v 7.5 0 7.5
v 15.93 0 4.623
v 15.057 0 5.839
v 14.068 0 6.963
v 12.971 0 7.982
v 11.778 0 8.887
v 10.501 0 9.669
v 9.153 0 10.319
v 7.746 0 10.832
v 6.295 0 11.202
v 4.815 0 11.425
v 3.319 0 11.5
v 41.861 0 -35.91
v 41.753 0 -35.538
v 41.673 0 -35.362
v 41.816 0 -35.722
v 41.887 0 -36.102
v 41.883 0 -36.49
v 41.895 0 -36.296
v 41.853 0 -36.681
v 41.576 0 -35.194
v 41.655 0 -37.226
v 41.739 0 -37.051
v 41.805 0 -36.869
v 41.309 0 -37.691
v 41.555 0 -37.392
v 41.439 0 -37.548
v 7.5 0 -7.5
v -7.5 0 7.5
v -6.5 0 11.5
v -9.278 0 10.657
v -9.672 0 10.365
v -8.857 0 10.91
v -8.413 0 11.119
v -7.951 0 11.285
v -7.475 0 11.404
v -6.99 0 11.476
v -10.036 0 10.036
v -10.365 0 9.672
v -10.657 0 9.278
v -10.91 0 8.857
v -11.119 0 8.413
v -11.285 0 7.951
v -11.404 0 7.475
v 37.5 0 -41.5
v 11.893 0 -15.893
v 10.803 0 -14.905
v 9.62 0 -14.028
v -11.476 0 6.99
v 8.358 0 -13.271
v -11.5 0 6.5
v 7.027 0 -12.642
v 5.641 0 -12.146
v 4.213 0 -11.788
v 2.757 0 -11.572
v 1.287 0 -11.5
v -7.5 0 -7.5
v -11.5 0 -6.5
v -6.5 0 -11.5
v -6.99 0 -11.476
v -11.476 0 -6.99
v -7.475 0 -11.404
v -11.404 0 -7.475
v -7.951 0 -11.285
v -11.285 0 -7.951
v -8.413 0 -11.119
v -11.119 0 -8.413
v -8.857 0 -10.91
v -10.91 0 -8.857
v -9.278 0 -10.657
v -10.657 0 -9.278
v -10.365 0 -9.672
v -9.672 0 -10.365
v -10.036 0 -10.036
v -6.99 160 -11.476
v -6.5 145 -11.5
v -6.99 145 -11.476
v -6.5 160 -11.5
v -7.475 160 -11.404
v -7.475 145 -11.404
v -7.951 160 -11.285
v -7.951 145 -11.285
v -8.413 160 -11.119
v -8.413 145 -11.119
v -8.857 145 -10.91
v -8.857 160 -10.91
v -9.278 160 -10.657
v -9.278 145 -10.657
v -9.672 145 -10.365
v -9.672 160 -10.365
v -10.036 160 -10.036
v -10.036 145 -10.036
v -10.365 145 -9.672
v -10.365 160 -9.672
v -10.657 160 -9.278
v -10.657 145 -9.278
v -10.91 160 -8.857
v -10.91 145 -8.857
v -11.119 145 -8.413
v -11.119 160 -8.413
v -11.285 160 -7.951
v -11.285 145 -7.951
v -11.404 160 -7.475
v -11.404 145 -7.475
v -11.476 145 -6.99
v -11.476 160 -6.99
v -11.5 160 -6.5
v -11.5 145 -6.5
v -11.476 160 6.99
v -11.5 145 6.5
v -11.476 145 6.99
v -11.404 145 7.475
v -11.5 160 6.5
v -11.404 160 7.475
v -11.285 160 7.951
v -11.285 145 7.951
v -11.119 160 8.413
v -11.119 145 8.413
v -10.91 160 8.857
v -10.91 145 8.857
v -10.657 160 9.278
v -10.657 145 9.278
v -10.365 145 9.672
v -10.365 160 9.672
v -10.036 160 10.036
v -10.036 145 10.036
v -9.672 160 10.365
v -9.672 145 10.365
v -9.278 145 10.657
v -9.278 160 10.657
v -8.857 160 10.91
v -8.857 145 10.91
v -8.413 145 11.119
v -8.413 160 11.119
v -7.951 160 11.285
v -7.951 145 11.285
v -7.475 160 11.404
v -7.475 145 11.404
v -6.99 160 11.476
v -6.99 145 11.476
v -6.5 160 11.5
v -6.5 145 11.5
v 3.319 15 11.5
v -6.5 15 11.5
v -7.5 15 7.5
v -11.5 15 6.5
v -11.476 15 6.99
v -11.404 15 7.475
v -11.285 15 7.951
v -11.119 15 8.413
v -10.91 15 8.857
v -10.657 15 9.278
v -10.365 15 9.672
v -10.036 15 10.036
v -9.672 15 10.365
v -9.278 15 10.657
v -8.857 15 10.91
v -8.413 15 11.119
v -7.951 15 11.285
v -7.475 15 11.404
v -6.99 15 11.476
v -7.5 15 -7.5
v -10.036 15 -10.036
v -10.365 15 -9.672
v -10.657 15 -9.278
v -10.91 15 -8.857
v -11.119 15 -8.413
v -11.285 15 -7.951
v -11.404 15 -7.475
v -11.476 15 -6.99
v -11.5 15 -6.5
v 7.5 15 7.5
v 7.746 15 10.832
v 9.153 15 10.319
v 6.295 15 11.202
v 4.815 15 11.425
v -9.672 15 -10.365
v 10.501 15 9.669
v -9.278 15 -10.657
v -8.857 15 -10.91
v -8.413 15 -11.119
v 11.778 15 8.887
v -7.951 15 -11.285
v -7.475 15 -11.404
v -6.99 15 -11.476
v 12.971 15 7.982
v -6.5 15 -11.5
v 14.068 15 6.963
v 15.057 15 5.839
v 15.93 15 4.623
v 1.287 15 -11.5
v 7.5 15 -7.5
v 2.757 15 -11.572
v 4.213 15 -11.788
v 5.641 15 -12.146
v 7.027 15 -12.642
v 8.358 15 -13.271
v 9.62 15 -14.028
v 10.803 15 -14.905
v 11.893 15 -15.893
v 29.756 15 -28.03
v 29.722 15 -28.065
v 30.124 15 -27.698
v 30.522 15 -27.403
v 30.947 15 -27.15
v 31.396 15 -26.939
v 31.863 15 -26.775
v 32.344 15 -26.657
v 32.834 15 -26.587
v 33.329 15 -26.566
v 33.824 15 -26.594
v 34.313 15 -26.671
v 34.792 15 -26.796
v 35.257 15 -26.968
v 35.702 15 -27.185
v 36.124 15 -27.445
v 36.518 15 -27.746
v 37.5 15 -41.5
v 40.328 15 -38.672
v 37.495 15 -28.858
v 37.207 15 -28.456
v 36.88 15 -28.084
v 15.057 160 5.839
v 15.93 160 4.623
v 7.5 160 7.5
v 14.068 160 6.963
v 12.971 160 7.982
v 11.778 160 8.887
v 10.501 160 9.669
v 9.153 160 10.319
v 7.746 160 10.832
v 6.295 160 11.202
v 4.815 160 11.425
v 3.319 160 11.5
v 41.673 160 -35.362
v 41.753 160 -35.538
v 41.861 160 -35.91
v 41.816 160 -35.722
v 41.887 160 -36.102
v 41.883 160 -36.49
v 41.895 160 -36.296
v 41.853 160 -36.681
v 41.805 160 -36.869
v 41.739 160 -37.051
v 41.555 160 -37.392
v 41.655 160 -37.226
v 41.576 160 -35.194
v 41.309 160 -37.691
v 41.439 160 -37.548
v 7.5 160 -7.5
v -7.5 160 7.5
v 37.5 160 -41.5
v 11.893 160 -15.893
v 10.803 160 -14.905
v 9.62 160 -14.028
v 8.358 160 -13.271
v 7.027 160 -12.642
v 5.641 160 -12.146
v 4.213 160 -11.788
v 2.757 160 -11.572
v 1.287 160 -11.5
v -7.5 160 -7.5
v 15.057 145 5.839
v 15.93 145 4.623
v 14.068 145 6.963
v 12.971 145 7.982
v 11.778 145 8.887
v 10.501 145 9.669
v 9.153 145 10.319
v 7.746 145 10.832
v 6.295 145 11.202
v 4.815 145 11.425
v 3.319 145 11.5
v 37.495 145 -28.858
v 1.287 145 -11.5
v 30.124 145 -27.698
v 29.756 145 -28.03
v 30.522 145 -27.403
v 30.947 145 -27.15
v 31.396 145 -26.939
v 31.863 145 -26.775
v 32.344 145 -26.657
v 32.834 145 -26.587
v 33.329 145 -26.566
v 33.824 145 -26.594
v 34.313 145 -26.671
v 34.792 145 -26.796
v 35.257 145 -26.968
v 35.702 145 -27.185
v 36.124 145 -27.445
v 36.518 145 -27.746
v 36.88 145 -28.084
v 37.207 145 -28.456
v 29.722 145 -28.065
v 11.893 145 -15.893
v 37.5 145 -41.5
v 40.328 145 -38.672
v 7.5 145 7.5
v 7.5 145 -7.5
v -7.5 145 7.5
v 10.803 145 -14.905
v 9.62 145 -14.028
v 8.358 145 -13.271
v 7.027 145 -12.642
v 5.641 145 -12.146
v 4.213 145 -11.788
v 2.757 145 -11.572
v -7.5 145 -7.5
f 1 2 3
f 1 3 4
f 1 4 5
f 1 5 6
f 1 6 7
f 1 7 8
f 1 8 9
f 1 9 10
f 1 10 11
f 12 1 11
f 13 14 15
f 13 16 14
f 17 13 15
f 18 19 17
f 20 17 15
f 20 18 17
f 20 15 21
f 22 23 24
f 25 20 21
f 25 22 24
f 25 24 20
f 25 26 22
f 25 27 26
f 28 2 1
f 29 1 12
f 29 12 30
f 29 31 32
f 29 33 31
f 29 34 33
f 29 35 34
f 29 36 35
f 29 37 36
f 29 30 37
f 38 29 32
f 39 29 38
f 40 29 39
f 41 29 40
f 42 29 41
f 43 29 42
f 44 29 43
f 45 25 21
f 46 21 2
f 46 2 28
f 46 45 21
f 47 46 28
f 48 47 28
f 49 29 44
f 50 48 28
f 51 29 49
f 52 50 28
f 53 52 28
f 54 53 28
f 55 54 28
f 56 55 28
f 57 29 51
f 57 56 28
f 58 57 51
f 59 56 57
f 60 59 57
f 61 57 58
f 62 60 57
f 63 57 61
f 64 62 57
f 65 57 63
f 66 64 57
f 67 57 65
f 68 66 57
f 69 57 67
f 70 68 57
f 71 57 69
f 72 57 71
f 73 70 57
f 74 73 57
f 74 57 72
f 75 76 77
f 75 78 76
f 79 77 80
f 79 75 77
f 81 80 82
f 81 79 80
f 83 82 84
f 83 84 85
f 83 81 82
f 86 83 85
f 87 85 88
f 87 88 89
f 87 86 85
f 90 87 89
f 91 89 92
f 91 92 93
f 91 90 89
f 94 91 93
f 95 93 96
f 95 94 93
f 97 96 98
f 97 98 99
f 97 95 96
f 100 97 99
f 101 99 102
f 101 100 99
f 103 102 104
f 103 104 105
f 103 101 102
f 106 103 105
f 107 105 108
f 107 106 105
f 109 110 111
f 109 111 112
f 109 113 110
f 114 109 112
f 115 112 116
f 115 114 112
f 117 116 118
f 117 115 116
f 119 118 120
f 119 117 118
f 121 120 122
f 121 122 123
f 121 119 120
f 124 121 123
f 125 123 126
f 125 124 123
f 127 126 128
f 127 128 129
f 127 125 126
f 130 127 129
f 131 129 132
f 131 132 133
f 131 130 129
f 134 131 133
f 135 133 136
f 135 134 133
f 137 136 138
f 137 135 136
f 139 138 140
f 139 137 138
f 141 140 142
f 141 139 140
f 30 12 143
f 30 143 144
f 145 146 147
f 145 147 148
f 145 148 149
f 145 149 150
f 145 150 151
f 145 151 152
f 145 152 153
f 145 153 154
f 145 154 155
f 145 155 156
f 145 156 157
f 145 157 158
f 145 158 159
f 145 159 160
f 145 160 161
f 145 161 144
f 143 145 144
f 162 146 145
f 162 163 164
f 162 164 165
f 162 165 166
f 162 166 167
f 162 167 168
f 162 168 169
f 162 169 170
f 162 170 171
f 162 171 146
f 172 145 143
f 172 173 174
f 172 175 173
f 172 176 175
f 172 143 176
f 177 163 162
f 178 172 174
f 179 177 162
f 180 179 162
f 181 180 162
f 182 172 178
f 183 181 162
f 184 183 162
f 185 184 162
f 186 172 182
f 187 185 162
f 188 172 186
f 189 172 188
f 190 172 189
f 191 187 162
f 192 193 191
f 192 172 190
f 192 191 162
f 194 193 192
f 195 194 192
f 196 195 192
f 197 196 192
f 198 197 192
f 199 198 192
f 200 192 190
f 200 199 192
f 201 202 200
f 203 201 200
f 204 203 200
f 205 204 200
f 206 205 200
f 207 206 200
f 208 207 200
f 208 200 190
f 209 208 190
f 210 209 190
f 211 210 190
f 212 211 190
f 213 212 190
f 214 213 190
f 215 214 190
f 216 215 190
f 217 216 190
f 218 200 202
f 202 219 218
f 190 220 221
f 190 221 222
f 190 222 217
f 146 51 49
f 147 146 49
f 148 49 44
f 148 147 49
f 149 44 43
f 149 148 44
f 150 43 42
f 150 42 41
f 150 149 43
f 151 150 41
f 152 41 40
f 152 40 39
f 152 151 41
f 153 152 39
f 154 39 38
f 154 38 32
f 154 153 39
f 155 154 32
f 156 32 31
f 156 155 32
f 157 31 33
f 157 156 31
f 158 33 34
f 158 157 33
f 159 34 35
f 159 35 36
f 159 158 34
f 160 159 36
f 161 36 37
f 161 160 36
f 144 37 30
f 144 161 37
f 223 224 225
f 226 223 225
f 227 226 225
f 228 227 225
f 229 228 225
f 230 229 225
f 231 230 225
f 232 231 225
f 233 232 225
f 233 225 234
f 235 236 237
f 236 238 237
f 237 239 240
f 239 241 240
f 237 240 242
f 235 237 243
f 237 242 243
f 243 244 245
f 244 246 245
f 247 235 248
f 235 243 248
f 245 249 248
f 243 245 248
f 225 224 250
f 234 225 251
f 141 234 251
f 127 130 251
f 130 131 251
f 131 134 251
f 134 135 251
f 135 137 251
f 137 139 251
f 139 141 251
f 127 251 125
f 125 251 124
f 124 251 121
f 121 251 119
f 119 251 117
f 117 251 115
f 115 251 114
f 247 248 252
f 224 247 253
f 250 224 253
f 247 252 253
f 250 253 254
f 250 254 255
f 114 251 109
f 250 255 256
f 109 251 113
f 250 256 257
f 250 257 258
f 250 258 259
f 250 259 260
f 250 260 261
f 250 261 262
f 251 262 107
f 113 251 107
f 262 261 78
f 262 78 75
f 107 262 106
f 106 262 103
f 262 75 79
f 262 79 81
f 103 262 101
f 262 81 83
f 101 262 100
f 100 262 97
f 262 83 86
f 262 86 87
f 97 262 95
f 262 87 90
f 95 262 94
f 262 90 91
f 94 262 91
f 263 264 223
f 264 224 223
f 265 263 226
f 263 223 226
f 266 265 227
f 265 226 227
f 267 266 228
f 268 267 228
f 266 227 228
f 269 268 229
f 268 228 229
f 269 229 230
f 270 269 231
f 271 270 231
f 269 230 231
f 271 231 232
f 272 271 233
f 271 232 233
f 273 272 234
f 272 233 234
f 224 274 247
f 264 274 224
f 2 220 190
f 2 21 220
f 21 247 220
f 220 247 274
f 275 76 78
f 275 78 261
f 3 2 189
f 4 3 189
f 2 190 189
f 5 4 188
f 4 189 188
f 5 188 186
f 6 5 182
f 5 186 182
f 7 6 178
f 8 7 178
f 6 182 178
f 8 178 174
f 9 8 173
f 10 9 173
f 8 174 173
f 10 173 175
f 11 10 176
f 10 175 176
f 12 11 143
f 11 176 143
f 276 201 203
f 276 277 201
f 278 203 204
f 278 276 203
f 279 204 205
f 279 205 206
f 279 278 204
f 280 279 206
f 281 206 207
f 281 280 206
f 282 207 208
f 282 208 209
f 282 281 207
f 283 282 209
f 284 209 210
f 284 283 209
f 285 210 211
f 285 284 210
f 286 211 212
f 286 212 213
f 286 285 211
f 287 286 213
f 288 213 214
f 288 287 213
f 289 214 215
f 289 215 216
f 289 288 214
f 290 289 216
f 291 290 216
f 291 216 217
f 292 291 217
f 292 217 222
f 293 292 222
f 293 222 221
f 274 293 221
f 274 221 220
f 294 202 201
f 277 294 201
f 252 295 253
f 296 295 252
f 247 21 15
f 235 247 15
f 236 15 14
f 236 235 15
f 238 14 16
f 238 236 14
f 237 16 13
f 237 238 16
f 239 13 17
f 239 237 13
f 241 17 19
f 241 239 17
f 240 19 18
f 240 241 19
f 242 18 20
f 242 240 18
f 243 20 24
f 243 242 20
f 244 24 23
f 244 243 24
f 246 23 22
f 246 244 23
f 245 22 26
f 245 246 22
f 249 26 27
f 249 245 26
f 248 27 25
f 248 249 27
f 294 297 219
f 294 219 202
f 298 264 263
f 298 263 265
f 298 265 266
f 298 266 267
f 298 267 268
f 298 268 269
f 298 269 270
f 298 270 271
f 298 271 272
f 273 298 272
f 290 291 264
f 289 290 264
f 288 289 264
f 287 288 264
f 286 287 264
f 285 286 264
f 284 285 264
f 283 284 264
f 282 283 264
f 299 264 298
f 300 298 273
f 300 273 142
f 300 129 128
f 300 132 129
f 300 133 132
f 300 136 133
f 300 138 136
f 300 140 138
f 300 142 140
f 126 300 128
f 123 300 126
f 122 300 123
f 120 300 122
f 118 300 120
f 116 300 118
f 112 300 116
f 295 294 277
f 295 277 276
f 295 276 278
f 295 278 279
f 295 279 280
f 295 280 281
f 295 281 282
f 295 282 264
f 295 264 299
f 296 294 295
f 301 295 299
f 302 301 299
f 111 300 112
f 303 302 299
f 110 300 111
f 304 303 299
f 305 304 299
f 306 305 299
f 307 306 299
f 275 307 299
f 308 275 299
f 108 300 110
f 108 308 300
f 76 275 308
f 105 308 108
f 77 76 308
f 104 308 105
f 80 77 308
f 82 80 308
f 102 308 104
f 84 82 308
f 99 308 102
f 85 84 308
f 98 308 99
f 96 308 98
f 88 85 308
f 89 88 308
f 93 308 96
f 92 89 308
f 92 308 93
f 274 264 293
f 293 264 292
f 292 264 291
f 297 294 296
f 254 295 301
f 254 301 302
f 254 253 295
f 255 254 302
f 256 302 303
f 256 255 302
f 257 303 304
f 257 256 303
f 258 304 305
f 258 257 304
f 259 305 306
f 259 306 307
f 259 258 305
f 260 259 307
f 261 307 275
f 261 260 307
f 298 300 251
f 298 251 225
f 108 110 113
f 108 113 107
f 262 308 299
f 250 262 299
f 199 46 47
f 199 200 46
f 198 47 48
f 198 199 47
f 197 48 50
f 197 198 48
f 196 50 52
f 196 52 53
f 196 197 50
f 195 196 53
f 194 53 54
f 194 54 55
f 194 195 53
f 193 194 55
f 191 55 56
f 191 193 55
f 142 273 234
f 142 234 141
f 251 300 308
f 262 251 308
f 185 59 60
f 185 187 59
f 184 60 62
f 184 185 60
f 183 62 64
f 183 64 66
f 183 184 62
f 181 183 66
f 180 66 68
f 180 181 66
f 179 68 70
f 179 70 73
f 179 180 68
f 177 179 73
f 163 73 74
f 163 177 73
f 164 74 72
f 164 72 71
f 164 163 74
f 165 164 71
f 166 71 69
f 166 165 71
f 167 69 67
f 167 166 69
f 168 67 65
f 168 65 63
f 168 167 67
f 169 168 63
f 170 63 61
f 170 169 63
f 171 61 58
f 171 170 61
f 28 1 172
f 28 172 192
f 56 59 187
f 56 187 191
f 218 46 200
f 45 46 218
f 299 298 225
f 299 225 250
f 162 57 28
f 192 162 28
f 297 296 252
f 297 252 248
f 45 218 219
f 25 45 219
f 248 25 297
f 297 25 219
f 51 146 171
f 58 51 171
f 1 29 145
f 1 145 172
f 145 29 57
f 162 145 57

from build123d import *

# Parameters (mm, degrees)
SKETCH_1_W          = 15.000000000000002
SKETCH_1_H          = 15
EXTRUDE_1_DEPTH     = 160
CUT_EXTRUDE_2_DEPTH = 35
FILLET_3_R          = 5
FILLET_4_R          = 5
FILLET_6_R          = 15
FILLET_7_R          = 15
FILLET_8_R          = 15
FILLET_9_R          = 15
EXTRUDE_2_DEPTH     = 159
FILLET_10_R         = 5
FILLET_11_R         = 2


with BuildPart() as part:
    # 草图1 → 凸台-拉伸1 (new body)
    with BuildSketch(Plane(origin=(0, 0, 0), x_dir=(1, 0, 0), z_dir=(0, 1, 0))):
        Polygon((-11.5, 11.500000000000002), (7.5, 11.500000000000002), (37.49999999999999, 41.49999999999999), (42.44974746830583, 36.550252531694156), (11.5, -11.5), (-11.5, -11.5), align=None)
        Rectangle(SKETCH_1_W, SKETCH_1_H, mode=Mode.SUBTRACT)
    extrude(amount=EXTRUDE_1_DEPTH)

    # 草图4 → 切除-拉伸2 (cut, symmetric)
    with BuildSketch(Plane(origin=(0, 0, -11.500000000000002), x_dir=(-1, 0, 0), z_dir=(0, 0, -1))):
        Polygon((-62.54884054332868, 145.00000000000003), (52.803582628705634, 145.00000000000003), (52.80358262870564, 15), (-62.548840543328666, 15), align=None)
    extrude(amount=CUT_EXTRUDE_2_DEPTH, both=True, mode=Mode.SUBTRACT)


with BuildPart() as cut_extrude_2_piece_1:
    # of the separate pieces the step leaves, piece 1, a body of its own (cut_extrude_2_pieces)
    add(part.part.solids().sort_by_distance((-11.5, 0, -11.5))[0])

    # 圆角4
    fillet_4_edges = [cut_extrude_2_piece_1.edges().sort_by_distance(p)[0] for p in [
        (-11.5, 7.5, 11.5),
        (-11.5, 7.5, -11.500000000000002),
    ]]
    fillet(fillet_4_edges, radius=FILLET_4_R)

    # 圆角7
    fillet_7_edges = [cut_extrude_2_piece_1.edges().sort_by_distance(p)[0] for p in [
        (11.5, 7.5, 11.5),
    ]]
    fillet(fillet_7_edges, radius=FILLET_7_R)

    # 圆角8
    fillet_8_edges = [cut_extrude_2_piece_1.edges().sort_by_distance(p)[0] for p in [
        (7.5, 7.5, -11.500000000000002),
    ]]
    fillet(fillet_8_edges, radius=FILLET_8_R)



with BuildPart() as cut_extrude_2_piece_2:
    # of the separate pieces the step leaves, piece 2, a body of its own (cut_extrude_2_pieces)
    add(part.part.solids().sort_by_distance((7.5, 145, -11.5))[0])

    # 圆角3
    fillet_3_edges = [cut_extrude_2_piece_2.edges().sort_by_distance(p)[0] for p in [
        (-11.5, 152.5, -11.500000000000002),
        (-11.5, 152.5, 11.5),
    ]]
    fillet(fillet_3_edges, radius=FILLET_3_R)

    # 圆角6
    fillet_6_edges = [cut_extrude_2_piece_2.edges().sort_by_distance(p)[0] for p in [
        (11.5, 152.5, 11.5),
    ]]
    fillet(fillet_6_edges, radius=FILLET_6_R)

    # 圆角9
    fillet_9_edges = [cut_extrude_2_piece_2.edges().sort_by_distance(p)[0] for p in [
        (7.5, 152.5, -11.500000000000002),
    ]]
    fillet(fillet_9_edges, radius=FILLET_9_R)


with BuildPart() as cut_extrude_2_piece_1_1:
    add(cut_extrude_2_piece_1.part)

    add(cut_extrude_2_piece_2.part)  # 凸台-拉伸2 merges 切除-拉伸2 piece 2
    # 草图6 → 凸台-拉伸2 (add)
    with BuildSketch(Plane.XZ):
        Polygon((29.72182540693865, -28.064971157451247), (34.139072919876334, -23.647723644513547), (42.44974746830049, -36.550252531685864), (40.328427124736876, -38.671572875249474), align=None)
    extrude(amount=-EXTRUDE_2_DEPTH)

    # 圆角10
    fillet_10_edges = [cut_extrude_2_piece_1_1.edges().sort_by_distance(p)[0] for p in [
        (34.139072919876334, 80.00000000000003, -23.647723644513547),
    ]]
    fillet(fillet_10_edges, radius=FILLET_10_R)

    # 圆角11
    fillet_11_edges = [cut_extrude_2_piece_1_1.edges().sort_by_distance(p)[0] for p in [
        (42.449747468304494, 80, -36.55025253169208),
    ]]
    fillet(fillet_11_edges, radius=FILLET_11_R)


solid = cut_extrude_2_piece_1_1.part
